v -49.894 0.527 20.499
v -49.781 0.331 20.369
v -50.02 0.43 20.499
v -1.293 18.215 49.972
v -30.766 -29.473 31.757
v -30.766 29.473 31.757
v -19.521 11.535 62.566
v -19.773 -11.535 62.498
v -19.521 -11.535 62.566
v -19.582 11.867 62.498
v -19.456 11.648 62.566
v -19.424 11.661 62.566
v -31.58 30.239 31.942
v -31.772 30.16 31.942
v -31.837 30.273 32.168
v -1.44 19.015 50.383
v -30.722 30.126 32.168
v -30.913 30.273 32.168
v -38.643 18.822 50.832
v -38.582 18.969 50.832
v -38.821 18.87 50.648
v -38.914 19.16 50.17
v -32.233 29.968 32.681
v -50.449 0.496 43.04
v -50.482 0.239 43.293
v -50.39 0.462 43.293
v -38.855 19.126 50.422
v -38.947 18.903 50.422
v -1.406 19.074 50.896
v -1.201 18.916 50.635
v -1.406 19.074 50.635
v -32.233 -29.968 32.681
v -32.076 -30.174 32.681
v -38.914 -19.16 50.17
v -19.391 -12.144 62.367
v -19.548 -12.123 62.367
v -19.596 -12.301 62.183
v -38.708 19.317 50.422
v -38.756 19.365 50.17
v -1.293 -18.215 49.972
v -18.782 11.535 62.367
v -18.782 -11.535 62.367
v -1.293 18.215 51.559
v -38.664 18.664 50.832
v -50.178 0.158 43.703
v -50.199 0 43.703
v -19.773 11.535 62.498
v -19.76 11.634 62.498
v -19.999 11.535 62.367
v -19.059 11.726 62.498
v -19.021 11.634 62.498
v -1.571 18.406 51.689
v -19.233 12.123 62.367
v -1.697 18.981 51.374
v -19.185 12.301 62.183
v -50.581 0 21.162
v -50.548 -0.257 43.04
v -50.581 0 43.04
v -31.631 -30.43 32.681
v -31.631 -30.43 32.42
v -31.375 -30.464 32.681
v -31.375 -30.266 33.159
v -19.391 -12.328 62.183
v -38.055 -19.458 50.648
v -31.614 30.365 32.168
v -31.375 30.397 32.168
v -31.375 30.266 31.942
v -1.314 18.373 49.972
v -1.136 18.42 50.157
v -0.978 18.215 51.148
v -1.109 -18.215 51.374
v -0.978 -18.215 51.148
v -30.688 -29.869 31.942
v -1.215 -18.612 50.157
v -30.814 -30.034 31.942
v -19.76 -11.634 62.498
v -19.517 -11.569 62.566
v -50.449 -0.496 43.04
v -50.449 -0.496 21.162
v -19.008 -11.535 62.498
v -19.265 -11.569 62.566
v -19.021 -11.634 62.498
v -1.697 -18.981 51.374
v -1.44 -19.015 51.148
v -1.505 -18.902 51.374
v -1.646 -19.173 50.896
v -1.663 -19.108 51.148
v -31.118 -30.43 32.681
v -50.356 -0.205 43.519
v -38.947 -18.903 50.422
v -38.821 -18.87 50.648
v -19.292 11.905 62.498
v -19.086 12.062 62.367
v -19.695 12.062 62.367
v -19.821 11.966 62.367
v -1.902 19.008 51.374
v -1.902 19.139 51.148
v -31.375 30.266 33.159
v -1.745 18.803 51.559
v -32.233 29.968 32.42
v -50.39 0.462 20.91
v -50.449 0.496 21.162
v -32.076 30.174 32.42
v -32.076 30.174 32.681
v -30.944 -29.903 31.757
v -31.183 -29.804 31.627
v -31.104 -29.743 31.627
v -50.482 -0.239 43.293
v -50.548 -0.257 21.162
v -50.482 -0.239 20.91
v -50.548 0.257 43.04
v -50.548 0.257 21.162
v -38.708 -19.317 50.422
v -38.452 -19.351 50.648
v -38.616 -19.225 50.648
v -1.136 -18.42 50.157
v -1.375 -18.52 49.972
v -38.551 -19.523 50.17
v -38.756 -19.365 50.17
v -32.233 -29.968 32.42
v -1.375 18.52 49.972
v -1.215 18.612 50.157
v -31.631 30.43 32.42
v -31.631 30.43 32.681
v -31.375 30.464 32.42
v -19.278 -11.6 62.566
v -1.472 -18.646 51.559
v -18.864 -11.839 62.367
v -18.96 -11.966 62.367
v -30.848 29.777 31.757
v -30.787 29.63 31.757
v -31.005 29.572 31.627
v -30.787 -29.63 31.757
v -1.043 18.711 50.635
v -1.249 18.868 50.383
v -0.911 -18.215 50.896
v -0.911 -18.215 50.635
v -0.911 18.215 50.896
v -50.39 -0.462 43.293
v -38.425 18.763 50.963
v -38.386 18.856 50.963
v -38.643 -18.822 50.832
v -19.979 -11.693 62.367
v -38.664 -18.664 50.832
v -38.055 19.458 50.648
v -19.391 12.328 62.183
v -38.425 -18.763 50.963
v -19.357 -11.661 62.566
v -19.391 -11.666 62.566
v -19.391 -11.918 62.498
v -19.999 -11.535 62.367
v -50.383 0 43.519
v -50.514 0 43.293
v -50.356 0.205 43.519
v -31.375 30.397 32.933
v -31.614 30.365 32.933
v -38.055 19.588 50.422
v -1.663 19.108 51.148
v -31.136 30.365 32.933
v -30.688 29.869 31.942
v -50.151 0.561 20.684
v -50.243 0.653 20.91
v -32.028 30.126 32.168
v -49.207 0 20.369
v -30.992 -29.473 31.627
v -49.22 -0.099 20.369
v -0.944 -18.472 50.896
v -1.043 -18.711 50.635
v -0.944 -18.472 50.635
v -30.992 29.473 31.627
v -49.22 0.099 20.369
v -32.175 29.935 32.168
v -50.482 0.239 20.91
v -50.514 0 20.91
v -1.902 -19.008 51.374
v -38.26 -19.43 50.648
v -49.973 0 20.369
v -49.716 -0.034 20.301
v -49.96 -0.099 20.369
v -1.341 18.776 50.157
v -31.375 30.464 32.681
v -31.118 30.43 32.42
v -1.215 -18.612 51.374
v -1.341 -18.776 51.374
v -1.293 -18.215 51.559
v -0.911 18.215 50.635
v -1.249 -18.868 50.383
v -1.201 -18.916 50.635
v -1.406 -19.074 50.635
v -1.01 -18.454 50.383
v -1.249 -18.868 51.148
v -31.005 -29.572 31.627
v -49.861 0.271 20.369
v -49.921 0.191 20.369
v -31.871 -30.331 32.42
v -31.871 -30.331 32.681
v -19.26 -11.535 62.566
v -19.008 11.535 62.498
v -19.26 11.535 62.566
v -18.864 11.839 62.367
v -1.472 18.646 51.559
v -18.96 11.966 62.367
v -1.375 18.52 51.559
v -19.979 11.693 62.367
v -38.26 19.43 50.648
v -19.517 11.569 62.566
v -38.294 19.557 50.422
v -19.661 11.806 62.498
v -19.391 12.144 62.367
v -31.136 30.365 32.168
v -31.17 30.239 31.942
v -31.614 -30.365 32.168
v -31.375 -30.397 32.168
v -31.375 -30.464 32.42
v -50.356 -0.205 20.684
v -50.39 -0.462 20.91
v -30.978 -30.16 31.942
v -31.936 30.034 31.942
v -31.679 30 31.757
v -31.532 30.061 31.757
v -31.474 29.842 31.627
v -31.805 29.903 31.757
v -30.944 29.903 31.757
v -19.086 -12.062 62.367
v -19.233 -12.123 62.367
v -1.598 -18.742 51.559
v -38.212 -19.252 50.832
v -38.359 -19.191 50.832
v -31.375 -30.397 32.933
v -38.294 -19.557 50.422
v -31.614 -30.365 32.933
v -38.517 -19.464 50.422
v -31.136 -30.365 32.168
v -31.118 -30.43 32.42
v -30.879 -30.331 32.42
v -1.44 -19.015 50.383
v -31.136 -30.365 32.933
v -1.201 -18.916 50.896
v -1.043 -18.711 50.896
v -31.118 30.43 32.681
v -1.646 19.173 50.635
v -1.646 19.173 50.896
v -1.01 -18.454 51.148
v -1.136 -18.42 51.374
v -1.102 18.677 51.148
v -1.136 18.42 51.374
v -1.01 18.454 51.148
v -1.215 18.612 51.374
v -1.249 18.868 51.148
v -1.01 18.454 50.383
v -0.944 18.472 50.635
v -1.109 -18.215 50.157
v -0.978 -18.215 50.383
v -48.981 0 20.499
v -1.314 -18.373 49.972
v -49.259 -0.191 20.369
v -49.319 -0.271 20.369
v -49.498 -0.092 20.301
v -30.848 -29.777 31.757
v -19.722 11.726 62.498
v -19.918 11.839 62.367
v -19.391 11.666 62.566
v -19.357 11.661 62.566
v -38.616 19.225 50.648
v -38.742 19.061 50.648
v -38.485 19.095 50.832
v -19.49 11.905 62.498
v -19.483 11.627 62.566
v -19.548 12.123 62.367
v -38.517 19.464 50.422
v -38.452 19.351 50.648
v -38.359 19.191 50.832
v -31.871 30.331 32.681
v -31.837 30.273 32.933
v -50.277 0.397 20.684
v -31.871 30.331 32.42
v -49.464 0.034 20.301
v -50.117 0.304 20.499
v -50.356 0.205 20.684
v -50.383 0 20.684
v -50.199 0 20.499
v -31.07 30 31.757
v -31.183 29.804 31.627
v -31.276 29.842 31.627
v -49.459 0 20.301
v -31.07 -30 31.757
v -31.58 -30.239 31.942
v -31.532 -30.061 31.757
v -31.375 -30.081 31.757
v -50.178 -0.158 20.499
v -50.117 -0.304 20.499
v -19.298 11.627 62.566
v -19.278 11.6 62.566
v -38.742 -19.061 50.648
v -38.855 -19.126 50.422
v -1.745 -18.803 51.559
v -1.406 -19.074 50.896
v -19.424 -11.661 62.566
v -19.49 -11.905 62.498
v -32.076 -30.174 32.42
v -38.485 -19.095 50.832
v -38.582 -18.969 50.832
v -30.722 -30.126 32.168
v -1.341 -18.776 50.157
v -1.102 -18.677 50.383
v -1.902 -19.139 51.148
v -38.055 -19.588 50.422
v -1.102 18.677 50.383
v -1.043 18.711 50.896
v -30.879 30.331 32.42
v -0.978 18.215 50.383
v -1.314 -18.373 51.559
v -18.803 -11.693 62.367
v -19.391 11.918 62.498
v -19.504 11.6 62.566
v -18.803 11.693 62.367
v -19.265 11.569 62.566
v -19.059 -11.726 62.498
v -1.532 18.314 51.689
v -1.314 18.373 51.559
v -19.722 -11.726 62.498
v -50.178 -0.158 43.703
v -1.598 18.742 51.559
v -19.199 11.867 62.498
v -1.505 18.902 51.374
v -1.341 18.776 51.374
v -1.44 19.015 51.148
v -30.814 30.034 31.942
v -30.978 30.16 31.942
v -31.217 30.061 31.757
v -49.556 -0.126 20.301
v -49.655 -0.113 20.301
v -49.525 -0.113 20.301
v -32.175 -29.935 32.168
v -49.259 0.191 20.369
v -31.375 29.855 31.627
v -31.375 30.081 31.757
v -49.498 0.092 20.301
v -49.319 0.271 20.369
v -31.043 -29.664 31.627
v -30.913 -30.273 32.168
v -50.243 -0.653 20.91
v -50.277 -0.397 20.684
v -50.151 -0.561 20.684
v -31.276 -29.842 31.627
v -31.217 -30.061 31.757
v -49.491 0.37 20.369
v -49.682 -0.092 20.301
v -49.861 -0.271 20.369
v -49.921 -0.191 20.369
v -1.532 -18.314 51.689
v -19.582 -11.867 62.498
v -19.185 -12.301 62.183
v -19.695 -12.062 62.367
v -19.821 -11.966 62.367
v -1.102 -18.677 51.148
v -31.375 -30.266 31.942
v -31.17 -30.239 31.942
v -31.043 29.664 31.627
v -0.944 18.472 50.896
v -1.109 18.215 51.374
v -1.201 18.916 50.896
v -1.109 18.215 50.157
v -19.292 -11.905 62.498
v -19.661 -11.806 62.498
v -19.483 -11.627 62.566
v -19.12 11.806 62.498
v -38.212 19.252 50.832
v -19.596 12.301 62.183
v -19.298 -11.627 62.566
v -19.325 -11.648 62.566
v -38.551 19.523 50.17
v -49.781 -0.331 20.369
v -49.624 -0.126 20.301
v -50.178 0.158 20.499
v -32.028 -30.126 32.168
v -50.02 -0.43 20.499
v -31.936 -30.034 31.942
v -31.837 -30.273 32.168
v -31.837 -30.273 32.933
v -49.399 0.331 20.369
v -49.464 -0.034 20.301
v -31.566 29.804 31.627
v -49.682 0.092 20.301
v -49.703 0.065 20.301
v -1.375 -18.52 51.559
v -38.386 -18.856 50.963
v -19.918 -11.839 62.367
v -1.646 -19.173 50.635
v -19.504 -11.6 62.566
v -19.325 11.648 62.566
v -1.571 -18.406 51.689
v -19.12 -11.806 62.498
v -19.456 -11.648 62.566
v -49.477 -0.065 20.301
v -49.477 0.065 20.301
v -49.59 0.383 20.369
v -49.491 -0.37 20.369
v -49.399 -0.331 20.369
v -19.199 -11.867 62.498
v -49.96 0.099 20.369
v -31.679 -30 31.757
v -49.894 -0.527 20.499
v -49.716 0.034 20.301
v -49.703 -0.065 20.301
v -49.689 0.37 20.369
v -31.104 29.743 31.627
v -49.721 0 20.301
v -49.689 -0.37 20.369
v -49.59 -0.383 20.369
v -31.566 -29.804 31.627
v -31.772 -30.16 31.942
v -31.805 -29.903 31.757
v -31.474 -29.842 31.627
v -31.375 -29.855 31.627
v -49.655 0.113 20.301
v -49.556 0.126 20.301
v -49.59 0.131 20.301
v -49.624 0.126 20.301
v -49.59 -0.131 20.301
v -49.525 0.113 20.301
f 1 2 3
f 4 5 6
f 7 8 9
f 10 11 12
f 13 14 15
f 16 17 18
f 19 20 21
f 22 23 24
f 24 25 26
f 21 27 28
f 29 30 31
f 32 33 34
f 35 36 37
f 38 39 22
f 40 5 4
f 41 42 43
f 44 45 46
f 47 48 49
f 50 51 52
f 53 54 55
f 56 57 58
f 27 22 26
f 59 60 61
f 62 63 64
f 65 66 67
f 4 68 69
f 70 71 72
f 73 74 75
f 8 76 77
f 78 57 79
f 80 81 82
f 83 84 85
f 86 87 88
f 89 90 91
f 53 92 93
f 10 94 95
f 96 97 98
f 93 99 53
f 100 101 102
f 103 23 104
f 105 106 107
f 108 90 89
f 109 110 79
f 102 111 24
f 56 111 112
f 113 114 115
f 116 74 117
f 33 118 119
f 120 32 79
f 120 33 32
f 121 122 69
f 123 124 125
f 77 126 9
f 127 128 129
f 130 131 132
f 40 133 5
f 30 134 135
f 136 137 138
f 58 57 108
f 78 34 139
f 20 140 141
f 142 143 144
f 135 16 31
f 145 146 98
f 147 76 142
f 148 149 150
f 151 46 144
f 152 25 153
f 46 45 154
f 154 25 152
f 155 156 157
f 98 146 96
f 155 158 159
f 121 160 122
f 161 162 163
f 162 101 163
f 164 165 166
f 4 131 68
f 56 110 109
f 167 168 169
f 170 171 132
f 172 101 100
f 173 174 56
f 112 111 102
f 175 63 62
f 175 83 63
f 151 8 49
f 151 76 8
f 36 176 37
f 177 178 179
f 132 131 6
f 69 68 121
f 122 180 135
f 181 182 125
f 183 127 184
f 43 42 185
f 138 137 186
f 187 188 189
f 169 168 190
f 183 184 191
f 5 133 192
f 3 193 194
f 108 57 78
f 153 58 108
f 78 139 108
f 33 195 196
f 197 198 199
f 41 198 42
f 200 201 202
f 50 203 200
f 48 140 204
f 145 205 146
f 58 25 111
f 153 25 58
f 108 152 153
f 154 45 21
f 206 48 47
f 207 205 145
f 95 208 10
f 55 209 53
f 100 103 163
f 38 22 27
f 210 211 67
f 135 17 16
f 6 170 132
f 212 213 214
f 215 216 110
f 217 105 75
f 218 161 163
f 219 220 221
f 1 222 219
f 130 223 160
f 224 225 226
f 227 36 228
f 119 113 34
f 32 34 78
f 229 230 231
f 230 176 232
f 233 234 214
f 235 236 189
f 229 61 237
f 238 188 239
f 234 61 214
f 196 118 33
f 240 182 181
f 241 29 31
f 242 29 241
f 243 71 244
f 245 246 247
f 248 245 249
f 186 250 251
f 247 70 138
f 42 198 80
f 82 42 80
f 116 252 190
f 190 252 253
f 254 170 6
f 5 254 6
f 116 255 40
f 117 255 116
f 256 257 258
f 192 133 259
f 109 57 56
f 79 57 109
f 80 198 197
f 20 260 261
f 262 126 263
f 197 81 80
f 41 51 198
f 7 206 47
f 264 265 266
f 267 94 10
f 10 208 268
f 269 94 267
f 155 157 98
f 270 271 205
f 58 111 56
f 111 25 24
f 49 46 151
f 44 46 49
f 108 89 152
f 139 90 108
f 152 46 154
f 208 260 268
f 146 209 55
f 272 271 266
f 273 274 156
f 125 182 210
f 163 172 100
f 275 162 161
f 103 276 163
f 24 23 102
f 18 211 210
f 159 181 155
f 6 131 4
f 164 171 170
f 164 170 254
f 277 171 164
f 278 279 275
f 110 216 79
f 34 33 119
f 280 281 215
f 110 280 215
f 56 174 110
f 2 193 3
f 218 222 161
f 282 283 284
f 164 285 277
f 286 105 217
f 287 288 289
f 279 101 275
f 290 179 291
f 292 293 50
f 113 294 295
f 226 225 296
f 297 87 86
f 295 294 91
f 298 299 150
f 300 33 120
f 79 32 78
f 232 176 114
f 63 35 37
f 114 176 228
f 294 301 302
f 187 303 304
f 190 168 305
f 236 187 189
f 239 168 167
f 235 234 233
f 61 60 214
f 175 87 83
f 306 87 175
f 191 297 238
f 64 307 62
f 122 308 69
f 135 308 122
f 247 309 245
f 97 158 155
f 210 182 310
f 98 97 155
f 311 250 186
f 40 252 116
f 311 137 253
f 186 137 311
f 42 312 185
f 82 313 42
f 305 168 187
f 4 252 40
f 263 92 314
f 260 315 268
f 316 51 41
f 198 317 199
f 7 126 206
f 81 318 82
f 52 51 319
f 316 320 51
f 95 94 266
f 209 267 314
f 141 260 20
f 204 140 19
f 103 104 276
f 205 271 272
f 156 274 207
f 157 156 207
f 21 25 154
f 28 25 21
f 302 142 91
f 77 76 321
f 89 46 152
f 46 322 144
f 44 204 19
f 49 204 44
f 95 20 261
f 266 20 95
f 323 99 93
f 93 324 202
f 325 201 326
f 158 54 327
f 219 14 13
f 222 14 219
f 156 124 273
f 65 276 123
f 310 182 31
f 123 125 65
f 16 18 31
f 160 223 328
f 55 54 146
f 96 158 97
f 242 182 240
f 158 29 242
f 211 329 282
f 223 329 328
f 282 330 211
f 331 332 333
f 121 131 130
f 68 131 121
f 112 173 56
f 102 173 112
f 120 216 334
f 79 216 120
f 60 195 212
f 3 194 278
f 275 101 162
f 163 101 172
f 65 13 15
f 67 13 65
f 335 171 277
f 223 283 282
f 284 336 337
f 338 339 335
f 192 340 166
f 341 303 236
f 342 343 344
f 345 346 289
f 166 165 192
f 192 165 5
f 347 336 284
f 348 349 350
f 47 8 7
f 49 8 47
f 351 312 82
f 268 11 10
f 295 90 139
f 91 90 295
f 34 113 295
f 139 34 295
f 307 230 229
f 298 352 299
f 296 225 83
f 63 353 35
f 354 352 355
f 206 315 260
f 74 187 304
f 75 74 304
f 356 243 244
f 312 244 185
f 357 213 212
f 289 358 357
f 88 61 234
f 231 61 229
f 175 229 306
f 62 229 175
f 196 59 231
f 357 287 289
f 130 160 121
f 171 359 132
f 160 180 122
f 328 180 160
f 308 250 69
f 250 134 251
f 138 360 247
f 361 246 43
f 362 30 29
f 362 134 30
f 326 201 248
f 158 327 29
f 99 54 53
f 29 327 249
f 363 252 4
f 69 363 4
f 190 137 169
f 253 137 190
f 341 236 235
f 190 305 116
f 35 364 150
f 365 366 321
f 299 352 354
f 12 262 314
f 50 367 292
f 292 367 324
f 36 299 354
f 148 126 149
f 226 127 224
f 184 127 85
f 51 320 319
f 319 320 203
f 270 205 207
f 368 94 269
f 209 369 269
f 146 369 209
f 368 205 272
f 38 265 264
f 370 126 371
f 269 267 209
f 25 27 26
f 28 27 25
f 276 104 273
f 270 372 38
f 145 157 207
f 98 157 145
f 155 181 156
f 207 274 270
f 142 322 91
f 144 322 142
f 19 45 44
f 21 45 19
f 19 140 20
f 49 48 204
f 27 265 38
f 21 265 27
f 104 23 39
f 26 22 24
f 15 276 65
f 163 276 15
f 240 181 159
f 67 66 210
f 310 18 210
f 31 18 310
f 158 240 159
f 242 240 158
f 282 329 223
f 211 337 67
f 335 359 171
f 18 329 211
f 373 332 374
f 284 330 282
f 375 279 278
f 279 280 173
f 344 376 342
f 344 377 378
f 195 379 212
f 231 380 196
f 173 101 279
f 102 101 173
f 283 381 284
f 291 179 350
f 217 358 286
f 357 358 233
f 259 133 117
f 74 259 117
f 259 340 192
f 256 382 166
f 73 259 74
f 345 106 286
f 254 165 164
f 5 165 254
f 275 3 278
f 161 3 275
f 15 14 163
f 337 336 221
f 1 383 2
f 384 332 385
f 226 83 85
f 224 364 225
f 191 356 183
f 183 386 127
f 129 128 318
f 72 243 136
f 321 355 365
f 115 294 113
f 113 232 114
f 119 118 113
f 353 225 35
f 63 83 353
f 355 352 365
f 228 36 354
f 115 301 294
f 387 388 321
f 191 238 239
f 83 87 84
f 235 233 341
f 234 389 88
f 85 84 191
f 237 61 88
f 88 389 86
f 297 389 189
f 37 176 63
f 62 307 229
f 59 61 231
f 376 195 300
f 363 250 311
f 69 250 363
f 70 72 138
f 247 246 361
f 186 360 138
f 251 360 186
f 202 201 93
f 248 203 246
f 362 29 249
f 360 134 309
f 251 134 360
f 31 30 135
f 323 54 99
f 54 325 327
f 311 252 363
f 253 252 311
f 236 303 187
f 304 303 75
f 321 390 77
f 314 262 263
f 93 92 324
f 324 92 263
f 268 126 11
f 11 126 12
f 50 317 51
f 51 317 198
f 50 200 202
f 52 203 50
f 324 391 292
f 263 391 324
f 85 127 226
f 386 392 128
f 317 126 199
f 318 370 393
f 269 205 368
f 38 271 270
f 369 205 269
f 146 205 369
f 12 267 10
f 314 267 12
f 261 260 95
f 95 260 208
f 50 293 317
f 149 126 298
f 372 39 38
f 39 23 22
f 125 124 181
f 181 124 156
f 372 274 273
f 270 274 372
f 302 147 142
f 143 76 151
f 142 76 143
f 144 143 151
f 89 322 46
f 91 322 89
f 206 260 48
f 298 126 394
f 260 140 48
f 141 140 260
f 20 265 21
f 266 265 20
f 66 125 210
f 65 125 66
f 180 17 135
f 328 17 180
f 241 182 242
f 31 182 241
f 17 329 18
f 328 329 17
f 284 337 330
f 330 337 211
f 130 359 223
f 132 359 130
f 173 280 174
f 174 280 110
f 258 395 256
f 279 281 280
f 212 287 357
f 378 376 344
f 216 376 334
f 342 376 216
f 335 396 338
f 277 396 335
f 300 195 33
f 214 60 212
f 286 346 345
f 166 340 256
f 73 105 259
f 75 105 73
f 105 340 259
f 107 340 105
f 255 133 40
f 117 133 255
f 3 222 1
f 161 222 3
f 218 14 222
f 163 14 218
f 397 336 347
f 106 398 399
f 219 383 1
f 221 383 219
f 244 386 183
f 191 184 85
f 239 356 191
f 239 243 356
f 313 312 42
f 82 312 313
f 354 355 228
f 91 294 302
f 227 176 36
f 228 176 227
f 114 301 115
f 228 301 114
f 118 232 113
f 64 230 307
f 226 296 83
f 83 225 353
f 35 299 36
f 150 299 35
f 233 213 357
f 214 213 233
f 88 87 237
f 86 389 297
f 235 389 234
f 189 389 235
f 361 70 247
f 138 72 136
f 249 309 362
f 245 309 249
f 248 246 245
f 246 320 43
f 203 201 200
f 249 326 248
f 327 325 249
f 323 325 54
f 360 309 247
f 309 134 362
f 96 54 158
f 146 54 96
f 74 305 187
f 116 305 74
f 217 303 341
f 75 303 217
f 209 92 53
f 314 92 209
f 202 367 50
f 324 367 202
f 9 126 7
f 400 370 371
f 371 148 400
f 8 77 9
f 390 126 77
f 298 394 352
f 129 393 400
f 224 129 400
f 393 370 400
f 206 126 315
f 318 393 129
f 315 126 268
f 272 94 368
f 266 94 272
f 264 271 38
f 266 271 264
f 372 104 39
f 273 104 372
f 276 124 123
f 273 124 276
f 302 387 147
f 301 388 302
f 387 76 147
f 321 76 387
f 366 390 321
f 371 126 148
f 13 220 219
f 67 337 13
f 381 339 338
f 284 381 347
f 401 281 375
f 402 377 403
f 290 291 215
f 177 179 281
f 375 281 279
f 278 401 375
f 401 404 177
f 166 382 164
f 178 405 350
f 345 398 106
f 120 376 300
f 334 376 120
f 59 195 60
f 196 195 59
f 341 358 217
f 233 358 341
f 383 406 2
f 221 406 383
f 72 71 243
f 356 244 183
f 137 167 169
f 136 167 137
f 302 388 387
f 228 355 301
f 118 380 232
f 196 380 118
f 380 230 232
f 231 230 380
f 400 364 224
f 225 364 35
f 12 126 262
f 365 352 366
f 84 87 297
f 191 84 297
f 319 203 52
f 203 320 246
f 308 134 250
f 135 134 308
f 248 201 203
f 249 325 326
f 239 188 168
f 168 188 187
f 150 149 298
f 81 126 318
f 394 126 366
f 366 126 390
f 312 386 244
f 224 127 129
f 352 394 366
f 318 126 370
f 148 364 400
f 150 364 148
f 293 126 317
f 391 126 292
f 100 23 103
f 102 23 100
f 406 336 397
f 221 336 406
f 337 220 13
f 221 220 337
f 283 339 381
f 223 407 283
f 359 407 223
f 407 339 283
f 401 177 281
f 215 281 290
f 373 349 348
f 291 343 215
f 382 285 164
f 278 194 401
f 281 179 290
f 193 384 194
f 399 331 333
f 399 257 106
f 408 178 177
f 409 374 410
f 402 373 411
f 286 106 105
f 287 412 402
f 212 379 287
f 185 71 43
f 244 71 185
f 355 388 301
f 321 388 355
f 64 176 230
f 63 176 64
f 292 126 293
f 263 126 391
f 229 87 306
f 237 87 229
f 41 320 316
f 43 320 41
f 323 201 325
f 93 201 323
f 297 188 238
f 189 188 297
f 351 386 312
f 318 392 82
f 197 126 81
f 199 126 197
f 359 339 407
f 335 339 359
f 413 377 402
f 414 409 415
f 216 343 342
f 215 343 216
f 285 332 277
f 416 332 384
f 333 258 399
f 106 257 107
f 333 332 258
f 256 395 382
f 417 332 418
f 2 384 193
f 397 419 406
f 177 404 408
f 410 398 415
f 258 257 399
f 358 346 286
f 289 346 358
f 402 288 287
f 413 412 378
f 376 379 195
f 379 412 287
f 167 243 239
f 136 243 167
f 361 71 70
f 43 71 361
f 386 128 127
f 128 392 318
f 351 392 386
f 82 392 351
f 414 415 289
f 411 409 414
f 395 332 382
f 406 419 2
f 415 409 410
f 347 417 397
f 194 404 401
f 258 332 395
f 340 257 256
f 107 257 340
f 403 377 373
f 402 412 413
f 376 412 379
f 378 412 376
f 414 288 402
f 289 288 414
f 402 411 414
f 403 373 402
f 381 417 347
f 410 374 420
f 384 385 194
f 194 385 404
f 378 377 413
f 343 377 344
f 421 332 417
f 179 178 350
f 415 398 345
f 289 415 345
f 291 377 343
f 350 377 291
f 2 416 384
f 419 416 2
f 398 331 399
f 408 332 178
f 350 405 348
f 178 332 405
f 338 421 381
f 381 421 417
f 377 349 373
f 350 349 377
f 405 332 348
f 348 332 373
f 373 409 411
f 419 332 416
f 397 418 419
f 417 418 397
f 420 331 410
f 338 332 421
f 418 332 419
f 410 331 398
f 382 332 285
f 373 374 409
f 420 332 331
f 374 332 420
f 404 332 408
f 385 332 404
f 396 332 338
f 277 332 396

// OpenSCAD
// file: def.scad
inf = 1000;

round_radius = 1;
sticker_margin = 2.5;
sticker_round_radius = 0.75;

phi = (sqrt(5) + 1) / 2;
outer_radius = 80;
edge_length = outer_radius / sqrt(phi * phi * phi * phi + 1) * 2;
inner_radius = sqrt(outer_radius * outer_radius - (edge_length / 2 / cos(54)) * (edge_length / 2 / cos(54)));
cut1_length = edge_length / (1 / (phi * phi) + 2) * 3;
center_cut_length = edge_length * (sin(54) + 1);
cut1_dis = inner_radius * (center_cut_length - cut1_length) / (center_cut_length - edge_length);

theta = atan(edge_length / 2 * tan(54) / inner_radius);

face_inner_radius = edge_length / 2 * tan(54);
face_center_length = edge_length * tan(54) / cos(18);
sticker_cut1_dis = face_inner_radius * (face_center_length - cut1_length) / (face_center_length - edge_length);
sticker_dif_cut1_dis = sticker_cut1_dis - round_radius * tan(theta) + round_radius - sticker_margin;
sticker_int_cut1_dis = sticker_cut1_dis + round_radius / tan(theta) - round_radius + sticker_margin;
sticker_dif_cut2_dis = face_inner_radius - round_radius * tan(theta) + round_radius - sticker_margin;

module _int_cut1() {
    translate([-inf, -inf, cut1_dis + round_radius])
        cube([inf * 2, inf * 2, inf]);
}

module _dif_cut1() {
    translate([-inf, -inf, cut1_dis - round_radius])
        cube([inf * 2, inf * 2, inf]);
}

module _sticker_int_cut1() {
    rotate([-90, 0, 0])
        translate([-inf, -inf, sticker_int_cut1_dis])
            cube([inf * 2, inf * 2, inf]);
}

module _sticker_dif_cut1() {
    rotate([-90, 0, 0])
        translate([-inf, -inf, sticker_dif_cut1_dis])
            cube([inf * 2, inf * 2, inf]);
}

module _sticker_dif_cut2() {
    rotate([-90, 0, 0])
        translate([-inf, -inf, sticker_dif_cut2_dis])
            cube([inf * 2, inf * 2, inf]);
}

module _base() {
    intersection_for(vec = [[0, 0, 0], [90, 90, 0], [90, 0, 90]])
        intersection_for(ang = [theta, -theta, 180 + theta, 180 - theta])
            rotate(vec)
                rotate([0, ang, 0])
                    translate([-inf, -inf, -inner_radius + round_radius])
                        cube([inf * 2, inf * 2, inf]);
}

module _sticker_base() {
    difference() {
        cube([inf, inf, 0.1], center = true);
        for (ang = [0 : 72 : 288])
            rotate([0, 0, ang])
                _sticker_dif_cut2();
    }
}

module _selector_base(dis) {
    intersection_for(vec = [[0, 0, 0], [90, 90, 0], [90, 0, 90]])
        intersection_for(ang = [theta, -theta, 180 + theta, 180 - theta])
            rotate(vec)
                rotate([0, ang, 0])
                    translate([-inf, -inf, -dis])
                        cube([inf * 2, inf * 2, inf]);
}
// main file
include <def.scad>

module center_block() {
    minkowski() {
        difference() {
            intersection() {
                _base();
                rotate([0, -theta, 0])
                    _int_cut1();
            }
            for (vec = [[0, theta, 0], [-90 + theta, 0, 0], [0, -90, -theta], [0, -90, theta], [90 - theta, 0, 0]])
                rotate(vec)
                    _dif_cut1();
        }
        sphere(r = round_radius, $fn = 24);
    }
}

center_block();
